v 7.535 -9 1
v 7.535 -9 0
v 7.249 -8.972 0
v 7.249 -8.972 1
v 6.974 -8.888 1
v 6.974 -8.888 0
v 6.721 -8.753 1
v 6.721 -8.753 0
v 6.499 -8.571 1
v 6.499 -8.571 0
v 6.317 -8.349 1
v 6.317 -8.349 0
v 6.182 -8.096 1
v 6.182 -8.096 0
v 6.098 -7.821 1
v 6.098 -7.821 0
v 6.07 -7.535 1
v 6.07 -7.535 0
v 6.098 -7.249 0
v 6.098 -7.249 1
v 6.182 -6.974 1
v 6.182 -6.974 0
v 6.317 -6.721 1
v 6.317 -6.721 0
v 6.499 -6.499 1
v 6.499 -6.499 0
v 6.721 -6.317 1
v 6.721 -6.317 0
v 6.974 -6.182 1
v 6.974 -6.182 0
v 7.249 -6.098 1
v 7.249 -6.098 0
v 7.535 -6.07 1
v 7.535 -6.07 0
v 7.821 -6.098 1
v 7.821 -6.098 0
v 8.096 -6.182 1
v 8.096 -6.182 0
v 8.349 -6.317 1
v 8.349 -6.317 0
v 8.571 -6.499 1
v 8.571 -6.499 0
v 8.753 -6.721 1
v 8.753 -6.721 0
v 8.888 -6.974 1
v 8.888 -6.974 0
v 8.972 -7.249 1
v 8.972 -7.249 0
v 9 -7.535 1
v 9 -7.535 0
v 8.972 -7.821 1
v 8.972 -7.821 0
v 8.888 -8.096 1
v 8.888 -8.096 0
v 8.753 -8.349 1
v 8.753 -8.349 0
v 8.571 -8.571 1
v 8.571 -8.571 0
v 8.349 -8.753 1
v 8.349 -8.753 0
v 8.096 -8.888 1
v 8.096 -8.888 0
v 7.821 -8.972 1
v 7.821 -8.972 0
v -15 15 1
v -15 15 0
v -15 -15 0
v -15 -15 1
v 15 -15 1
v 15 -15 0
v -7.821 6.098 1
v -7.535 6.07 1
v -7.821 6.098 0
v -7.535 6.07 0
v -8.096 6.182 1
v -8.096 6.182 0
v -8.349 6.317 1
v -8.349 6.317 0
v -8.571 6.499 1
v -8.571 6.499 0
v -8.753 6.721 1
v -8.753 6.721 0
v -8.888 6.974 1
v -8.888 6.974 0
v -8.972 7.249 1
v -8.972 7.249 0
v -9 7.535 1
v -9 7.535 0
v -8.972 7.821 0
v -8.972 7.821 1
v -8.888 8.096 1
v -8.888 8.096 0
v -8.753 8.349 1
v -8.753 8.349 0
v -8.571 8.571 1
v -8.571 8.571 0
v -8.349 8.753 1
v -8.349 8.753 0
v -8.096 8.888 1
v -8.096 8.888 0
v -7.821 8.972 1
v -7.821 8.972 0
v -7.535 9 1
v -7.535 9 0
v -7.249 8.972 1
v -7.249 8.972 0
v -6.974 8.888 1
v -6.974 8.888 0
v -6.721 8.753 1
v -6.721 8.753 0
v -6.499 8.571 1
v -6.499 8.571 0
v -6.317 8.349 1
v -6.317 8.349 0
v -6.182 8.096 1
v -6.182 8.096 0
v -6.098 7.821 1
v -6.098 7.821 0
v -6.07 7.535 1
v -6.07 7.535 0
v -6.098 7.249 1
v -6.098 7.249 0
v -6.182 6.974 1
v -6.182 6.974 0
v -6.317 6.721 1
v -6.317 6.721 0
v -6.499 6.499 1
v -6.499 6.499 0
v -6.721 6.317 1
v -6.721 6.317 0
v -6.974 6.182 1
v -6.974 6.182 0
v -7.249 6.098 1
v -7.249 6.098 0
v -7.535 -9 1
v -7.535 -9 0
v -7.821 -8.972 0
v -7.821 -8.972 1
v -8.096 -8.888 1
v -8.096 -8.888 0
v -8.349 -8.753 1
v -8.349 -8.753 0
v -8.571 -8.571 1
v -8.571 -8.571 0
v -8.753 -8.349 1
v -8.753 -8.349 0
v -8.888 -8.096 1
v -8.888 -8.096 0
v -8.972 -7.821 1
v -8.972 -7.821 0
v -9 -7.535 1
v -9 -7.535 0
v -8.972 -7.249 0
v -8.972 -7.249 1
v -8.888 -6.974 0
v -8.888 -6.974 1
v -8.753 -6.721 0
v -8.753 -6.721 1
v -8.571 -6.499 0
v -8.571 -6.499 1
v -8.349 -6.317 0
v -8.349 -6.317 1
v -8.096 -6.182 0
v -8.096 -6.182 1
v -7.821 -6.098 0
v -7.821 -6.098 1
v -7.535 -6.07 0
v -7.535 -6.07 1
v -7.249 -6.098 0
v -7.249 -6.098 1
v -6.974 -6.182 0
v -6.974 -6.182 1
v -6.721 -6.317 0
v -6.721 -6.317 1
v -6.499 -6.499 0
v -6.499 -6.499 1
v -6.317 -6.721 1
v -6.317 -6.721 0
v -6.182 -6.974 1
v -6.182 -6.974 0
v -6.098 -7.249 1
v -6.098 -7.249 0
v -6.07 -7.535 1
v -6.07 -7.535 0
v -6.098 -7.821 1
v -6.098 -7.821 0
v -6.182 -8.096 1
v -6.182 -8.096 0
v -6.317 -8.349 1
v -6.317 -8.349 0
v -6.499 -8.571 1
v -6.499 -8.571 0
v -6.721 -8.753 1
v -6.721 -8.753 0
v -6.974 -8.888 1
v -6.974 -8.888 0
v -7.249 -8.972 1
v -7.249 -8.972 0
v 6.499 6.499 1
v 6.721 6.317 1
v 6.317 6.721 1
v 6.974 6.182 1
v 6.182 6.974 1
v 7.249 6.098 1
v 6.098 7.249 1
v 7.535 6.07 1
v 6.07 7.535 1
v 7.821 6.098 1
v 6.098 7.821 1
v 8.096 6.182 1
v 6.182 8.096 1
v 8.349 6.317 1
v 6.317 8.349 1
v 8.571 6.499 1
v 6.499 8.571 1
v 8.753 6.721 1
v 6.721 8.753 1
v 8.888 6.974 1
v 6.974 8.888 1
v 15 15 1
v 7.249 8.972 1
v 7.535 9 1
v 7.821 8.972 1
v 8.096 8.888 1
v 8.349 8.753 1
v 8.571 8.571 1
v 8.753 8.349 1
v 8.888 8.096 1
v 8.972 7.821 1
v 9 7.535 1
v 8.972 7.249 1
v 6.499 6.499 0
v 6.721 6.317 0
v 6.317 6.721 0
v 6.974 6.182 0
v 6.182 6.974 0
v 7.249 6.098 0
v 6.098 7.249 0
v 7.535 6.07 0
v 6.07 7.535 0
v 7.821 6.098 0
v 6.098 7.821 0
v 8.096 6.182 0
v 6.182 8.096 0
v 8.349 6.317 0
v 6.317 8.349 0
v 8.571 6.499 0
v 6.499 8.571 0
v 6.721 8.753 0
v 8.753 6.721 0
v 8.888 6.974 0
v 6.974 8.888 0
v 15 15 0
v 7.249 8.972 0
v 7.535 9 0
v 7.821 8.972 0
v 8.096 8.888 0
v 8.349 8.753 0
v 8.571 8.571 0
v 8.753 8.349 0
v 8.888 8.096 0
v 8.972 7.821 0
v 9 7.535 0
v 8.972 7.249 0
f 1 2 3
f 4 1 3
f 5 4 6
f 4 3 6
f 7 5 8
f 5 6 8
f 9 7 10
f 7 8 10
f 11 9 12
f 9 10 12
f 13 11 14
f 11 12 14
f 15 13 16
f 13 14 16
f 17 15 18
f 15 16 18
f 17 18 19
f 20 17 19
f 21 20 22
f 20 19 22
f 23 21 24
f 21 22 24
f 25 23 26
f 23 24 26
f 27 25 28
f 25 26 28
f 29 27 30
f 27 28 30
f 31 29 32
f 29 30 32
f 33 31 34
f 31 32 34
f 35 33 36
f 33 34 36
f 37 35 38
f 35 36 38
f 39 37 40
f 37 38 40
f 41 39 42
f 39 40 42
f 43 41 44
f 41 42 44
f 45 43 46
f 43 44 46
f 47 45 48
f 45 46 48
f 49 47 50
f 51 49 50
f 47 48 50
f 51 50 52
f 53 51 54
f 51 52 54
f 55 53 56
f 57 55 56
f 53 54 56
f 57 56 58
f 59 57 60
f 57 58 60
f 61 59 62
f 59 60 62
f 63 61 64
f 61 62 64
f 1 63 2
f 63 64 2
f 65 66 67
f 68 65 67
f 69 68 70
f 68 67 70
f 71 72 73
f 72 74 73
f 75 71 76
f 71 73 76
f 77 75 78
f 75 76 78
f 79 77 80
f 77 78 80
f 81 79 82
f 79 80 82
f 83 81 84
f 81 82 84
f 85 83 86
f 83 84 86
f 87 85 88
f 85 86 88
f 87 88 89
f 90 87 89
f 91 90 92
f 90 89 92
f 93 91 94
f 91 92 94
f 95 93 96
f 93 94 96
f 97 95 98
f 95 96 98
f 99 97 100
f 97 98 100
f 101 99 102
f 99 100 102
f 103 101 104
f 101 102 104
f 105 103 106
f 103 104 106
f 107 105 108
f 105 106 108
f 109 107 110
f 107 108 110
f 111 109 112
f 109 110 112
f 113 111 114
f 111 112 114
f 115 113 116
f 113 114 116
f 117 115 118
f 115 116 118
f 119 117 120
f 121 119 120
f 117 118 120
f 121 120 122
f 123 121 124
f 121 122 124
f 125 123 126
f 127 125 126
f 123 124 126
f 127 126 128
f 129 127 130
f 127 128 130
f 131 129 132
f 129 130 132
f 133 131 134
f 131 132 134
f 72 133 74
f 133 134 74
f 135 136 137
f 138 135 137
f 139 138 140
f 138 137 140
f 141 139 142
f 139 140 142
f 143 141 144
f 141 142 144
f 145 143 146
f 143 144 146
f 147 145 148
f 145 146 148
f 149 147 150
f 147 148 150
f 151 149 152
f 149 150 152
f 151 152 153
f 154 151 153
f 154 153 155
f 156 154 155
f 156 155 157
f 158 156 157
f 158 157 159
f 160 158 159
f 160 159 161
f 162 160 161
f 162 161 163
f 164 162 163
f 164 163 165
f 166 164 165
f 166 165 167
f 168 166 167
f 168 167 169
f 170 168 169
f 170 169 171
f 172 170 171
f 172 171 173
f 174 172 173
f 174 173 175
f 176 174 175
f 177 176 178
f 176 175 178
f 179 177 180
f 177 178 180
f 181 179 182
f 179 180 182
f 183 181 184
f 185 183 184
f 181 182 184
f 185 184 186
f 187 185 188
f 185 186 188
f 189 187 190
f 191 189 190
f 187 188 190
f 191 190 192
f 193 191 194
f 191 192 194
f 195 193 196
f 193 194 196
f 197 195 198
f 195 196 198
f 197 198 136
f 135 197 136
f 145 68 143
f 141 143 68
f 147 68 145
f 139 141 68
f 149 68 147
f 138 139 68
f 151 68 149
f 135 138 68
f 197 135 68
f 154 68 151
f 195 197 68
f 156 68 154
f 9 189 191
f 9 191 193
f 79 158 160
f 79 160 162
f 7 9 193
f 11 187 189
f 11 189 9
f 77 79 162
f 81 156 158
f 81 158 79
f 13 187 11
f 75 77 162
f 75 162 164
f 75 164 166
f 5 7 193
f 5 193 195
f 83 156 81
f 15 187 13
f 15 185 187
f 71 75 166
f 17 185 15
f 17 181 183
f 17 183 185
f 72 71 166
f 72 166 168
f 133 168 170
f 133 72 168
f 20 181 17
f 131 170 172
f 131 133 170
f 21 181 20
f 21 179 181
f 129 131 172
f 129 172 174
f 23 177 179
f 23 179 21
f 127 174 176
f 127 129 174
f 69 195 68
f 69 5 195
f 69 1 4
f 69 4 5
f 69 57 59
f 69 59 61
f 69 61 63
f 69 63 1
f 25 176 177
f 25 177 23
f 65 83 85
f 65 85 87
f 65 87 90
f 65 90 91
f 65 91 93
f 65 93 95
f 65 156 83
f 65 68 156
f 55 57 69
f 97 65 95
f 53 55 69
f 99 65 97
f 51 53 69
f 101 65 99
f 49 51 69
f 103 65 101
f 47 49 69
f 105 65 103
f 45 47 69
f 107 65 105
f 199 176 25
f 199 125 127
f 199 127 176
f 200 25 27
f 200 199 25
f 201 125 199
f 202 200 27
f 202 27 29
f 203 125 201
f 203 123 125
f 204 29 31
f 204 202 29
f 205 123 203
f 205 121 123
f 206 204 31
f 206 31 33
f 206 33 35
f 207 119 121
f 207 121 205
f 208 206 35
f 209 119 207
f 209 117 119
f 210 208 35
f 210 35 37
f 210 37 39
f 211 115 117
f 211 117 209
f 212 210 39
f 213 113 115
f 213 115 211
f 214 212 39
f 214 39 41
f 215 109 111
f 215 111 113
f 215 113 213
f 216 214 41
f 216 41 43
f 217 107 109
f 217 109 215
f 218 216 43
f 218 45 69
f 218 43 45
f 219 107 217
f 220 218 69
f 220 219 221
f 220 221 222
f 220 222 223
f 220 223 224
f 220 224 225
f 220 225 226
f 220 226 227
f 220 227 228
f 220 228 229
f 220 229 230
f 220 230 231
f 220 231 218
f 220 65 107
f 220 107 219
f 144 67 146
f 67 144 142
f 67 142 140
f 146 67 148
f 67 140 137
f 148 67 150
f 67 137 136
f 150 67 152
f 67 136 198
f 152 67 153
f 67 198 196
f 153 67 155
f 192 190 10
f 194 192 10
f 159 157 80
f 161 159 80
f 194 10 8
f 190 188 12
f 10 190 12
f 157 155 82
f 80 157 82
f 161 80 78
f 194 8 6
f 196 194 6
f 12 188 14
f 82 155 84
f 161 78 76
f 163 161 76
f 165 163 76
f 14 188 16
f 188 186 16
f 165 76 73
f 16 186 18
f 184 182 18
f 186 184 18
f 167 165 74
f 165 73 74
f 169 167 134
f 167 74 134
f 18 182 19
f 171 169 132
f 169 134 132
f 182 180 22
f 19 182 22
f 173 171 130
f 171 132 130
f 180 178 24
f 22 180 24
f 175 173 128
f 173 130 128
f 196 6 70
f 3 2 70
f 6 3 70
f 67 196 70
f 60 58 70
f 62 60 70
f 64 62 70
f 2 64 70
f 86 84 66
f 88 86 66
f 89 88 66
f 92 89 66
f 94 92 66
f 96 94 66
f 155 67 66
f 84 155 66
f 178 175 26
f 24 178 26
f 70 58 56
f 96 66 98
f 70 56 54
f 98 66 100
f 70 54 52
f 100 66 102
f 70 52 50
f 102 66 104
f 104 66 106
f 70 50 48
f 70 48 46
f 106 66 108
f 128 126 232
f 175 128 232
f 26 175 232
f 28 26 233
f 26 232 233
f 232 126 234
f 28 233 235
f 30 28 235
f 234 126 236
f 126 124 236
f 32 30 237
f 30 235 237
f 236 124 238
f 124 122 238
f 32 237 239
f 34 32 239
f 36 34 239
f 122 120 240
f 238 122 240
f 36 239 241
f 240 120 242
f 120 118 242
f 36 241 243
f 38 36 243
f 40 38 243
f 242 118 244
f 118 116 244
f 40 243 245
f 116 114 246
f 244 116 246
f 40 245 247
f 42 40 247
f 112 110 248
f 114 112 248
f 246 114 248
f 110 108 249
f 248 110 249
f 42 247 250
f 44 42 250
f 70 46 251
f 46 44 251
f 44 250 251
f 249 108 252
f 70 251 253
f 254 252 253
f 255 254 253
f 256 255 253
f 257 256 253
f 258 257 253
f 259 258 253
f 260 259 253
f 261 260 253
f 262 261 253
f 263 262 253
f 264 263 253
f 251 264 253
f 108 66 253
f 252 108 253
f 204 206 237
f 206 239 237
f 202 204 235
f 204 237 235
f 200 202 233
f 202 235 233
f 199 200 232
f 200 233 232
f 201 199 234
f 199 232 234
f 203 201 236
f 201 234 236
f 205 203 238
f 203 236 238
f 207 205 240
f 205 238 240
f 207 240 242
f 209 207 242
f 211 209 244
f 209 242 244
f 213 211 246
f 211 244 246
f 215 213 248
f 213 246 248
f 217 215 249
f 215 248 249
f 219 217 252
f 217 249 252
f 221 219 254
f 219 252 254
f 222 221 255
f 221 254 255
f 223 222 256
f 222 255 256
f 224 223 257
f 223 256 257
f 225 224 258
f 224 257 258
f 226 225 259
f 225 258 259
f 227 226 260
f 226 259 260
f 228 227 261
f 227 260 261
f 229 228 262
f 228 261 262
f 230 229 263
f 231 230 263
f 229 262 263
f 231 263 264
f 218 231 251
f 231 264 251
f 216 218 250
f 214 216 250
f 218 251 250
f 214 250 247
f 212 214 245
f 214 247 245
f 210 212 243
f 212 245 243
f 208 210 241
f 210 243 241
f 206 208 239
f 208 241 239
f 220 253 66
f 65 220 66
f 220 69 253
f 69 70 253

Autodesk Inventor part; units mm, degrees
ref_plane "YZ Plane" through (0, 0, 0) normal (1, 0, 0) x (0, 1, 0)
ref_plane "XZ Plane" through (0, 0, 0) normal (0, 1, 0) x (-1, 0, 0)
ref_plane "XY Plane" through (0, 0, 0) normal (0, 0, 1) x (1, 0, 0)
sketch "Skizze1" plane through (0, 0, 0) normal (0, 0, 1) x (1, 0, 0)
  line L0 (-15, -15) -> (15, -15)
  line L1 (15, -15) -> (15, 15)
  line L2 (15, 15) -> (-15, 15)
  line L3 (-15, 15) -> (-15, -15)
  line L4 (-15, -15) -> (15, 15) construction
  line L5 (15, -15) -> (-15, 15) construction
  point P0 (0, 0)
  dimension "d0" = 30
  dimension "d1" = 30
extrude "Extrusion1" add sketch "Skizze1" along normal blind 1
sketch "Sketch2" plane through (0, 0, 1) normal (0, 0, 1) x (1, 0, 0)
  line L0 (-15, -15) -> (15, -15) construction
  line L1 (15, -15) -> (15, 15) construction
  line L2 (15, 15) -> (-15, 15) construction
  line L3 (-15, 15) -> (-15, -15) construction
  line L4 (-7.535, 7.535) -> (7.535, 7.535) construction
  line L5 (7.535, 7.535) -> (7.535, -7.535) construction
  line L6 (7.535, -7.535) -> (-7.535, -7.535) construction
  line L7 (-7.535, -7.535) -> (-7.535, 7.535) construction
  point P0 (0, 0)
  dimension "d4" = 7.465
hole "Hole1" at (-7.535, 7.535, 1) at (7.535, 7.535, 1) at (7.535, -7.535, 1) at (-7.535, -7.535, 1) direction (0, 0, -1) diameter 2.93 end through all
equation "\"d1\" = d0"
properties part number "00_LED-ARRAY_4x4"
